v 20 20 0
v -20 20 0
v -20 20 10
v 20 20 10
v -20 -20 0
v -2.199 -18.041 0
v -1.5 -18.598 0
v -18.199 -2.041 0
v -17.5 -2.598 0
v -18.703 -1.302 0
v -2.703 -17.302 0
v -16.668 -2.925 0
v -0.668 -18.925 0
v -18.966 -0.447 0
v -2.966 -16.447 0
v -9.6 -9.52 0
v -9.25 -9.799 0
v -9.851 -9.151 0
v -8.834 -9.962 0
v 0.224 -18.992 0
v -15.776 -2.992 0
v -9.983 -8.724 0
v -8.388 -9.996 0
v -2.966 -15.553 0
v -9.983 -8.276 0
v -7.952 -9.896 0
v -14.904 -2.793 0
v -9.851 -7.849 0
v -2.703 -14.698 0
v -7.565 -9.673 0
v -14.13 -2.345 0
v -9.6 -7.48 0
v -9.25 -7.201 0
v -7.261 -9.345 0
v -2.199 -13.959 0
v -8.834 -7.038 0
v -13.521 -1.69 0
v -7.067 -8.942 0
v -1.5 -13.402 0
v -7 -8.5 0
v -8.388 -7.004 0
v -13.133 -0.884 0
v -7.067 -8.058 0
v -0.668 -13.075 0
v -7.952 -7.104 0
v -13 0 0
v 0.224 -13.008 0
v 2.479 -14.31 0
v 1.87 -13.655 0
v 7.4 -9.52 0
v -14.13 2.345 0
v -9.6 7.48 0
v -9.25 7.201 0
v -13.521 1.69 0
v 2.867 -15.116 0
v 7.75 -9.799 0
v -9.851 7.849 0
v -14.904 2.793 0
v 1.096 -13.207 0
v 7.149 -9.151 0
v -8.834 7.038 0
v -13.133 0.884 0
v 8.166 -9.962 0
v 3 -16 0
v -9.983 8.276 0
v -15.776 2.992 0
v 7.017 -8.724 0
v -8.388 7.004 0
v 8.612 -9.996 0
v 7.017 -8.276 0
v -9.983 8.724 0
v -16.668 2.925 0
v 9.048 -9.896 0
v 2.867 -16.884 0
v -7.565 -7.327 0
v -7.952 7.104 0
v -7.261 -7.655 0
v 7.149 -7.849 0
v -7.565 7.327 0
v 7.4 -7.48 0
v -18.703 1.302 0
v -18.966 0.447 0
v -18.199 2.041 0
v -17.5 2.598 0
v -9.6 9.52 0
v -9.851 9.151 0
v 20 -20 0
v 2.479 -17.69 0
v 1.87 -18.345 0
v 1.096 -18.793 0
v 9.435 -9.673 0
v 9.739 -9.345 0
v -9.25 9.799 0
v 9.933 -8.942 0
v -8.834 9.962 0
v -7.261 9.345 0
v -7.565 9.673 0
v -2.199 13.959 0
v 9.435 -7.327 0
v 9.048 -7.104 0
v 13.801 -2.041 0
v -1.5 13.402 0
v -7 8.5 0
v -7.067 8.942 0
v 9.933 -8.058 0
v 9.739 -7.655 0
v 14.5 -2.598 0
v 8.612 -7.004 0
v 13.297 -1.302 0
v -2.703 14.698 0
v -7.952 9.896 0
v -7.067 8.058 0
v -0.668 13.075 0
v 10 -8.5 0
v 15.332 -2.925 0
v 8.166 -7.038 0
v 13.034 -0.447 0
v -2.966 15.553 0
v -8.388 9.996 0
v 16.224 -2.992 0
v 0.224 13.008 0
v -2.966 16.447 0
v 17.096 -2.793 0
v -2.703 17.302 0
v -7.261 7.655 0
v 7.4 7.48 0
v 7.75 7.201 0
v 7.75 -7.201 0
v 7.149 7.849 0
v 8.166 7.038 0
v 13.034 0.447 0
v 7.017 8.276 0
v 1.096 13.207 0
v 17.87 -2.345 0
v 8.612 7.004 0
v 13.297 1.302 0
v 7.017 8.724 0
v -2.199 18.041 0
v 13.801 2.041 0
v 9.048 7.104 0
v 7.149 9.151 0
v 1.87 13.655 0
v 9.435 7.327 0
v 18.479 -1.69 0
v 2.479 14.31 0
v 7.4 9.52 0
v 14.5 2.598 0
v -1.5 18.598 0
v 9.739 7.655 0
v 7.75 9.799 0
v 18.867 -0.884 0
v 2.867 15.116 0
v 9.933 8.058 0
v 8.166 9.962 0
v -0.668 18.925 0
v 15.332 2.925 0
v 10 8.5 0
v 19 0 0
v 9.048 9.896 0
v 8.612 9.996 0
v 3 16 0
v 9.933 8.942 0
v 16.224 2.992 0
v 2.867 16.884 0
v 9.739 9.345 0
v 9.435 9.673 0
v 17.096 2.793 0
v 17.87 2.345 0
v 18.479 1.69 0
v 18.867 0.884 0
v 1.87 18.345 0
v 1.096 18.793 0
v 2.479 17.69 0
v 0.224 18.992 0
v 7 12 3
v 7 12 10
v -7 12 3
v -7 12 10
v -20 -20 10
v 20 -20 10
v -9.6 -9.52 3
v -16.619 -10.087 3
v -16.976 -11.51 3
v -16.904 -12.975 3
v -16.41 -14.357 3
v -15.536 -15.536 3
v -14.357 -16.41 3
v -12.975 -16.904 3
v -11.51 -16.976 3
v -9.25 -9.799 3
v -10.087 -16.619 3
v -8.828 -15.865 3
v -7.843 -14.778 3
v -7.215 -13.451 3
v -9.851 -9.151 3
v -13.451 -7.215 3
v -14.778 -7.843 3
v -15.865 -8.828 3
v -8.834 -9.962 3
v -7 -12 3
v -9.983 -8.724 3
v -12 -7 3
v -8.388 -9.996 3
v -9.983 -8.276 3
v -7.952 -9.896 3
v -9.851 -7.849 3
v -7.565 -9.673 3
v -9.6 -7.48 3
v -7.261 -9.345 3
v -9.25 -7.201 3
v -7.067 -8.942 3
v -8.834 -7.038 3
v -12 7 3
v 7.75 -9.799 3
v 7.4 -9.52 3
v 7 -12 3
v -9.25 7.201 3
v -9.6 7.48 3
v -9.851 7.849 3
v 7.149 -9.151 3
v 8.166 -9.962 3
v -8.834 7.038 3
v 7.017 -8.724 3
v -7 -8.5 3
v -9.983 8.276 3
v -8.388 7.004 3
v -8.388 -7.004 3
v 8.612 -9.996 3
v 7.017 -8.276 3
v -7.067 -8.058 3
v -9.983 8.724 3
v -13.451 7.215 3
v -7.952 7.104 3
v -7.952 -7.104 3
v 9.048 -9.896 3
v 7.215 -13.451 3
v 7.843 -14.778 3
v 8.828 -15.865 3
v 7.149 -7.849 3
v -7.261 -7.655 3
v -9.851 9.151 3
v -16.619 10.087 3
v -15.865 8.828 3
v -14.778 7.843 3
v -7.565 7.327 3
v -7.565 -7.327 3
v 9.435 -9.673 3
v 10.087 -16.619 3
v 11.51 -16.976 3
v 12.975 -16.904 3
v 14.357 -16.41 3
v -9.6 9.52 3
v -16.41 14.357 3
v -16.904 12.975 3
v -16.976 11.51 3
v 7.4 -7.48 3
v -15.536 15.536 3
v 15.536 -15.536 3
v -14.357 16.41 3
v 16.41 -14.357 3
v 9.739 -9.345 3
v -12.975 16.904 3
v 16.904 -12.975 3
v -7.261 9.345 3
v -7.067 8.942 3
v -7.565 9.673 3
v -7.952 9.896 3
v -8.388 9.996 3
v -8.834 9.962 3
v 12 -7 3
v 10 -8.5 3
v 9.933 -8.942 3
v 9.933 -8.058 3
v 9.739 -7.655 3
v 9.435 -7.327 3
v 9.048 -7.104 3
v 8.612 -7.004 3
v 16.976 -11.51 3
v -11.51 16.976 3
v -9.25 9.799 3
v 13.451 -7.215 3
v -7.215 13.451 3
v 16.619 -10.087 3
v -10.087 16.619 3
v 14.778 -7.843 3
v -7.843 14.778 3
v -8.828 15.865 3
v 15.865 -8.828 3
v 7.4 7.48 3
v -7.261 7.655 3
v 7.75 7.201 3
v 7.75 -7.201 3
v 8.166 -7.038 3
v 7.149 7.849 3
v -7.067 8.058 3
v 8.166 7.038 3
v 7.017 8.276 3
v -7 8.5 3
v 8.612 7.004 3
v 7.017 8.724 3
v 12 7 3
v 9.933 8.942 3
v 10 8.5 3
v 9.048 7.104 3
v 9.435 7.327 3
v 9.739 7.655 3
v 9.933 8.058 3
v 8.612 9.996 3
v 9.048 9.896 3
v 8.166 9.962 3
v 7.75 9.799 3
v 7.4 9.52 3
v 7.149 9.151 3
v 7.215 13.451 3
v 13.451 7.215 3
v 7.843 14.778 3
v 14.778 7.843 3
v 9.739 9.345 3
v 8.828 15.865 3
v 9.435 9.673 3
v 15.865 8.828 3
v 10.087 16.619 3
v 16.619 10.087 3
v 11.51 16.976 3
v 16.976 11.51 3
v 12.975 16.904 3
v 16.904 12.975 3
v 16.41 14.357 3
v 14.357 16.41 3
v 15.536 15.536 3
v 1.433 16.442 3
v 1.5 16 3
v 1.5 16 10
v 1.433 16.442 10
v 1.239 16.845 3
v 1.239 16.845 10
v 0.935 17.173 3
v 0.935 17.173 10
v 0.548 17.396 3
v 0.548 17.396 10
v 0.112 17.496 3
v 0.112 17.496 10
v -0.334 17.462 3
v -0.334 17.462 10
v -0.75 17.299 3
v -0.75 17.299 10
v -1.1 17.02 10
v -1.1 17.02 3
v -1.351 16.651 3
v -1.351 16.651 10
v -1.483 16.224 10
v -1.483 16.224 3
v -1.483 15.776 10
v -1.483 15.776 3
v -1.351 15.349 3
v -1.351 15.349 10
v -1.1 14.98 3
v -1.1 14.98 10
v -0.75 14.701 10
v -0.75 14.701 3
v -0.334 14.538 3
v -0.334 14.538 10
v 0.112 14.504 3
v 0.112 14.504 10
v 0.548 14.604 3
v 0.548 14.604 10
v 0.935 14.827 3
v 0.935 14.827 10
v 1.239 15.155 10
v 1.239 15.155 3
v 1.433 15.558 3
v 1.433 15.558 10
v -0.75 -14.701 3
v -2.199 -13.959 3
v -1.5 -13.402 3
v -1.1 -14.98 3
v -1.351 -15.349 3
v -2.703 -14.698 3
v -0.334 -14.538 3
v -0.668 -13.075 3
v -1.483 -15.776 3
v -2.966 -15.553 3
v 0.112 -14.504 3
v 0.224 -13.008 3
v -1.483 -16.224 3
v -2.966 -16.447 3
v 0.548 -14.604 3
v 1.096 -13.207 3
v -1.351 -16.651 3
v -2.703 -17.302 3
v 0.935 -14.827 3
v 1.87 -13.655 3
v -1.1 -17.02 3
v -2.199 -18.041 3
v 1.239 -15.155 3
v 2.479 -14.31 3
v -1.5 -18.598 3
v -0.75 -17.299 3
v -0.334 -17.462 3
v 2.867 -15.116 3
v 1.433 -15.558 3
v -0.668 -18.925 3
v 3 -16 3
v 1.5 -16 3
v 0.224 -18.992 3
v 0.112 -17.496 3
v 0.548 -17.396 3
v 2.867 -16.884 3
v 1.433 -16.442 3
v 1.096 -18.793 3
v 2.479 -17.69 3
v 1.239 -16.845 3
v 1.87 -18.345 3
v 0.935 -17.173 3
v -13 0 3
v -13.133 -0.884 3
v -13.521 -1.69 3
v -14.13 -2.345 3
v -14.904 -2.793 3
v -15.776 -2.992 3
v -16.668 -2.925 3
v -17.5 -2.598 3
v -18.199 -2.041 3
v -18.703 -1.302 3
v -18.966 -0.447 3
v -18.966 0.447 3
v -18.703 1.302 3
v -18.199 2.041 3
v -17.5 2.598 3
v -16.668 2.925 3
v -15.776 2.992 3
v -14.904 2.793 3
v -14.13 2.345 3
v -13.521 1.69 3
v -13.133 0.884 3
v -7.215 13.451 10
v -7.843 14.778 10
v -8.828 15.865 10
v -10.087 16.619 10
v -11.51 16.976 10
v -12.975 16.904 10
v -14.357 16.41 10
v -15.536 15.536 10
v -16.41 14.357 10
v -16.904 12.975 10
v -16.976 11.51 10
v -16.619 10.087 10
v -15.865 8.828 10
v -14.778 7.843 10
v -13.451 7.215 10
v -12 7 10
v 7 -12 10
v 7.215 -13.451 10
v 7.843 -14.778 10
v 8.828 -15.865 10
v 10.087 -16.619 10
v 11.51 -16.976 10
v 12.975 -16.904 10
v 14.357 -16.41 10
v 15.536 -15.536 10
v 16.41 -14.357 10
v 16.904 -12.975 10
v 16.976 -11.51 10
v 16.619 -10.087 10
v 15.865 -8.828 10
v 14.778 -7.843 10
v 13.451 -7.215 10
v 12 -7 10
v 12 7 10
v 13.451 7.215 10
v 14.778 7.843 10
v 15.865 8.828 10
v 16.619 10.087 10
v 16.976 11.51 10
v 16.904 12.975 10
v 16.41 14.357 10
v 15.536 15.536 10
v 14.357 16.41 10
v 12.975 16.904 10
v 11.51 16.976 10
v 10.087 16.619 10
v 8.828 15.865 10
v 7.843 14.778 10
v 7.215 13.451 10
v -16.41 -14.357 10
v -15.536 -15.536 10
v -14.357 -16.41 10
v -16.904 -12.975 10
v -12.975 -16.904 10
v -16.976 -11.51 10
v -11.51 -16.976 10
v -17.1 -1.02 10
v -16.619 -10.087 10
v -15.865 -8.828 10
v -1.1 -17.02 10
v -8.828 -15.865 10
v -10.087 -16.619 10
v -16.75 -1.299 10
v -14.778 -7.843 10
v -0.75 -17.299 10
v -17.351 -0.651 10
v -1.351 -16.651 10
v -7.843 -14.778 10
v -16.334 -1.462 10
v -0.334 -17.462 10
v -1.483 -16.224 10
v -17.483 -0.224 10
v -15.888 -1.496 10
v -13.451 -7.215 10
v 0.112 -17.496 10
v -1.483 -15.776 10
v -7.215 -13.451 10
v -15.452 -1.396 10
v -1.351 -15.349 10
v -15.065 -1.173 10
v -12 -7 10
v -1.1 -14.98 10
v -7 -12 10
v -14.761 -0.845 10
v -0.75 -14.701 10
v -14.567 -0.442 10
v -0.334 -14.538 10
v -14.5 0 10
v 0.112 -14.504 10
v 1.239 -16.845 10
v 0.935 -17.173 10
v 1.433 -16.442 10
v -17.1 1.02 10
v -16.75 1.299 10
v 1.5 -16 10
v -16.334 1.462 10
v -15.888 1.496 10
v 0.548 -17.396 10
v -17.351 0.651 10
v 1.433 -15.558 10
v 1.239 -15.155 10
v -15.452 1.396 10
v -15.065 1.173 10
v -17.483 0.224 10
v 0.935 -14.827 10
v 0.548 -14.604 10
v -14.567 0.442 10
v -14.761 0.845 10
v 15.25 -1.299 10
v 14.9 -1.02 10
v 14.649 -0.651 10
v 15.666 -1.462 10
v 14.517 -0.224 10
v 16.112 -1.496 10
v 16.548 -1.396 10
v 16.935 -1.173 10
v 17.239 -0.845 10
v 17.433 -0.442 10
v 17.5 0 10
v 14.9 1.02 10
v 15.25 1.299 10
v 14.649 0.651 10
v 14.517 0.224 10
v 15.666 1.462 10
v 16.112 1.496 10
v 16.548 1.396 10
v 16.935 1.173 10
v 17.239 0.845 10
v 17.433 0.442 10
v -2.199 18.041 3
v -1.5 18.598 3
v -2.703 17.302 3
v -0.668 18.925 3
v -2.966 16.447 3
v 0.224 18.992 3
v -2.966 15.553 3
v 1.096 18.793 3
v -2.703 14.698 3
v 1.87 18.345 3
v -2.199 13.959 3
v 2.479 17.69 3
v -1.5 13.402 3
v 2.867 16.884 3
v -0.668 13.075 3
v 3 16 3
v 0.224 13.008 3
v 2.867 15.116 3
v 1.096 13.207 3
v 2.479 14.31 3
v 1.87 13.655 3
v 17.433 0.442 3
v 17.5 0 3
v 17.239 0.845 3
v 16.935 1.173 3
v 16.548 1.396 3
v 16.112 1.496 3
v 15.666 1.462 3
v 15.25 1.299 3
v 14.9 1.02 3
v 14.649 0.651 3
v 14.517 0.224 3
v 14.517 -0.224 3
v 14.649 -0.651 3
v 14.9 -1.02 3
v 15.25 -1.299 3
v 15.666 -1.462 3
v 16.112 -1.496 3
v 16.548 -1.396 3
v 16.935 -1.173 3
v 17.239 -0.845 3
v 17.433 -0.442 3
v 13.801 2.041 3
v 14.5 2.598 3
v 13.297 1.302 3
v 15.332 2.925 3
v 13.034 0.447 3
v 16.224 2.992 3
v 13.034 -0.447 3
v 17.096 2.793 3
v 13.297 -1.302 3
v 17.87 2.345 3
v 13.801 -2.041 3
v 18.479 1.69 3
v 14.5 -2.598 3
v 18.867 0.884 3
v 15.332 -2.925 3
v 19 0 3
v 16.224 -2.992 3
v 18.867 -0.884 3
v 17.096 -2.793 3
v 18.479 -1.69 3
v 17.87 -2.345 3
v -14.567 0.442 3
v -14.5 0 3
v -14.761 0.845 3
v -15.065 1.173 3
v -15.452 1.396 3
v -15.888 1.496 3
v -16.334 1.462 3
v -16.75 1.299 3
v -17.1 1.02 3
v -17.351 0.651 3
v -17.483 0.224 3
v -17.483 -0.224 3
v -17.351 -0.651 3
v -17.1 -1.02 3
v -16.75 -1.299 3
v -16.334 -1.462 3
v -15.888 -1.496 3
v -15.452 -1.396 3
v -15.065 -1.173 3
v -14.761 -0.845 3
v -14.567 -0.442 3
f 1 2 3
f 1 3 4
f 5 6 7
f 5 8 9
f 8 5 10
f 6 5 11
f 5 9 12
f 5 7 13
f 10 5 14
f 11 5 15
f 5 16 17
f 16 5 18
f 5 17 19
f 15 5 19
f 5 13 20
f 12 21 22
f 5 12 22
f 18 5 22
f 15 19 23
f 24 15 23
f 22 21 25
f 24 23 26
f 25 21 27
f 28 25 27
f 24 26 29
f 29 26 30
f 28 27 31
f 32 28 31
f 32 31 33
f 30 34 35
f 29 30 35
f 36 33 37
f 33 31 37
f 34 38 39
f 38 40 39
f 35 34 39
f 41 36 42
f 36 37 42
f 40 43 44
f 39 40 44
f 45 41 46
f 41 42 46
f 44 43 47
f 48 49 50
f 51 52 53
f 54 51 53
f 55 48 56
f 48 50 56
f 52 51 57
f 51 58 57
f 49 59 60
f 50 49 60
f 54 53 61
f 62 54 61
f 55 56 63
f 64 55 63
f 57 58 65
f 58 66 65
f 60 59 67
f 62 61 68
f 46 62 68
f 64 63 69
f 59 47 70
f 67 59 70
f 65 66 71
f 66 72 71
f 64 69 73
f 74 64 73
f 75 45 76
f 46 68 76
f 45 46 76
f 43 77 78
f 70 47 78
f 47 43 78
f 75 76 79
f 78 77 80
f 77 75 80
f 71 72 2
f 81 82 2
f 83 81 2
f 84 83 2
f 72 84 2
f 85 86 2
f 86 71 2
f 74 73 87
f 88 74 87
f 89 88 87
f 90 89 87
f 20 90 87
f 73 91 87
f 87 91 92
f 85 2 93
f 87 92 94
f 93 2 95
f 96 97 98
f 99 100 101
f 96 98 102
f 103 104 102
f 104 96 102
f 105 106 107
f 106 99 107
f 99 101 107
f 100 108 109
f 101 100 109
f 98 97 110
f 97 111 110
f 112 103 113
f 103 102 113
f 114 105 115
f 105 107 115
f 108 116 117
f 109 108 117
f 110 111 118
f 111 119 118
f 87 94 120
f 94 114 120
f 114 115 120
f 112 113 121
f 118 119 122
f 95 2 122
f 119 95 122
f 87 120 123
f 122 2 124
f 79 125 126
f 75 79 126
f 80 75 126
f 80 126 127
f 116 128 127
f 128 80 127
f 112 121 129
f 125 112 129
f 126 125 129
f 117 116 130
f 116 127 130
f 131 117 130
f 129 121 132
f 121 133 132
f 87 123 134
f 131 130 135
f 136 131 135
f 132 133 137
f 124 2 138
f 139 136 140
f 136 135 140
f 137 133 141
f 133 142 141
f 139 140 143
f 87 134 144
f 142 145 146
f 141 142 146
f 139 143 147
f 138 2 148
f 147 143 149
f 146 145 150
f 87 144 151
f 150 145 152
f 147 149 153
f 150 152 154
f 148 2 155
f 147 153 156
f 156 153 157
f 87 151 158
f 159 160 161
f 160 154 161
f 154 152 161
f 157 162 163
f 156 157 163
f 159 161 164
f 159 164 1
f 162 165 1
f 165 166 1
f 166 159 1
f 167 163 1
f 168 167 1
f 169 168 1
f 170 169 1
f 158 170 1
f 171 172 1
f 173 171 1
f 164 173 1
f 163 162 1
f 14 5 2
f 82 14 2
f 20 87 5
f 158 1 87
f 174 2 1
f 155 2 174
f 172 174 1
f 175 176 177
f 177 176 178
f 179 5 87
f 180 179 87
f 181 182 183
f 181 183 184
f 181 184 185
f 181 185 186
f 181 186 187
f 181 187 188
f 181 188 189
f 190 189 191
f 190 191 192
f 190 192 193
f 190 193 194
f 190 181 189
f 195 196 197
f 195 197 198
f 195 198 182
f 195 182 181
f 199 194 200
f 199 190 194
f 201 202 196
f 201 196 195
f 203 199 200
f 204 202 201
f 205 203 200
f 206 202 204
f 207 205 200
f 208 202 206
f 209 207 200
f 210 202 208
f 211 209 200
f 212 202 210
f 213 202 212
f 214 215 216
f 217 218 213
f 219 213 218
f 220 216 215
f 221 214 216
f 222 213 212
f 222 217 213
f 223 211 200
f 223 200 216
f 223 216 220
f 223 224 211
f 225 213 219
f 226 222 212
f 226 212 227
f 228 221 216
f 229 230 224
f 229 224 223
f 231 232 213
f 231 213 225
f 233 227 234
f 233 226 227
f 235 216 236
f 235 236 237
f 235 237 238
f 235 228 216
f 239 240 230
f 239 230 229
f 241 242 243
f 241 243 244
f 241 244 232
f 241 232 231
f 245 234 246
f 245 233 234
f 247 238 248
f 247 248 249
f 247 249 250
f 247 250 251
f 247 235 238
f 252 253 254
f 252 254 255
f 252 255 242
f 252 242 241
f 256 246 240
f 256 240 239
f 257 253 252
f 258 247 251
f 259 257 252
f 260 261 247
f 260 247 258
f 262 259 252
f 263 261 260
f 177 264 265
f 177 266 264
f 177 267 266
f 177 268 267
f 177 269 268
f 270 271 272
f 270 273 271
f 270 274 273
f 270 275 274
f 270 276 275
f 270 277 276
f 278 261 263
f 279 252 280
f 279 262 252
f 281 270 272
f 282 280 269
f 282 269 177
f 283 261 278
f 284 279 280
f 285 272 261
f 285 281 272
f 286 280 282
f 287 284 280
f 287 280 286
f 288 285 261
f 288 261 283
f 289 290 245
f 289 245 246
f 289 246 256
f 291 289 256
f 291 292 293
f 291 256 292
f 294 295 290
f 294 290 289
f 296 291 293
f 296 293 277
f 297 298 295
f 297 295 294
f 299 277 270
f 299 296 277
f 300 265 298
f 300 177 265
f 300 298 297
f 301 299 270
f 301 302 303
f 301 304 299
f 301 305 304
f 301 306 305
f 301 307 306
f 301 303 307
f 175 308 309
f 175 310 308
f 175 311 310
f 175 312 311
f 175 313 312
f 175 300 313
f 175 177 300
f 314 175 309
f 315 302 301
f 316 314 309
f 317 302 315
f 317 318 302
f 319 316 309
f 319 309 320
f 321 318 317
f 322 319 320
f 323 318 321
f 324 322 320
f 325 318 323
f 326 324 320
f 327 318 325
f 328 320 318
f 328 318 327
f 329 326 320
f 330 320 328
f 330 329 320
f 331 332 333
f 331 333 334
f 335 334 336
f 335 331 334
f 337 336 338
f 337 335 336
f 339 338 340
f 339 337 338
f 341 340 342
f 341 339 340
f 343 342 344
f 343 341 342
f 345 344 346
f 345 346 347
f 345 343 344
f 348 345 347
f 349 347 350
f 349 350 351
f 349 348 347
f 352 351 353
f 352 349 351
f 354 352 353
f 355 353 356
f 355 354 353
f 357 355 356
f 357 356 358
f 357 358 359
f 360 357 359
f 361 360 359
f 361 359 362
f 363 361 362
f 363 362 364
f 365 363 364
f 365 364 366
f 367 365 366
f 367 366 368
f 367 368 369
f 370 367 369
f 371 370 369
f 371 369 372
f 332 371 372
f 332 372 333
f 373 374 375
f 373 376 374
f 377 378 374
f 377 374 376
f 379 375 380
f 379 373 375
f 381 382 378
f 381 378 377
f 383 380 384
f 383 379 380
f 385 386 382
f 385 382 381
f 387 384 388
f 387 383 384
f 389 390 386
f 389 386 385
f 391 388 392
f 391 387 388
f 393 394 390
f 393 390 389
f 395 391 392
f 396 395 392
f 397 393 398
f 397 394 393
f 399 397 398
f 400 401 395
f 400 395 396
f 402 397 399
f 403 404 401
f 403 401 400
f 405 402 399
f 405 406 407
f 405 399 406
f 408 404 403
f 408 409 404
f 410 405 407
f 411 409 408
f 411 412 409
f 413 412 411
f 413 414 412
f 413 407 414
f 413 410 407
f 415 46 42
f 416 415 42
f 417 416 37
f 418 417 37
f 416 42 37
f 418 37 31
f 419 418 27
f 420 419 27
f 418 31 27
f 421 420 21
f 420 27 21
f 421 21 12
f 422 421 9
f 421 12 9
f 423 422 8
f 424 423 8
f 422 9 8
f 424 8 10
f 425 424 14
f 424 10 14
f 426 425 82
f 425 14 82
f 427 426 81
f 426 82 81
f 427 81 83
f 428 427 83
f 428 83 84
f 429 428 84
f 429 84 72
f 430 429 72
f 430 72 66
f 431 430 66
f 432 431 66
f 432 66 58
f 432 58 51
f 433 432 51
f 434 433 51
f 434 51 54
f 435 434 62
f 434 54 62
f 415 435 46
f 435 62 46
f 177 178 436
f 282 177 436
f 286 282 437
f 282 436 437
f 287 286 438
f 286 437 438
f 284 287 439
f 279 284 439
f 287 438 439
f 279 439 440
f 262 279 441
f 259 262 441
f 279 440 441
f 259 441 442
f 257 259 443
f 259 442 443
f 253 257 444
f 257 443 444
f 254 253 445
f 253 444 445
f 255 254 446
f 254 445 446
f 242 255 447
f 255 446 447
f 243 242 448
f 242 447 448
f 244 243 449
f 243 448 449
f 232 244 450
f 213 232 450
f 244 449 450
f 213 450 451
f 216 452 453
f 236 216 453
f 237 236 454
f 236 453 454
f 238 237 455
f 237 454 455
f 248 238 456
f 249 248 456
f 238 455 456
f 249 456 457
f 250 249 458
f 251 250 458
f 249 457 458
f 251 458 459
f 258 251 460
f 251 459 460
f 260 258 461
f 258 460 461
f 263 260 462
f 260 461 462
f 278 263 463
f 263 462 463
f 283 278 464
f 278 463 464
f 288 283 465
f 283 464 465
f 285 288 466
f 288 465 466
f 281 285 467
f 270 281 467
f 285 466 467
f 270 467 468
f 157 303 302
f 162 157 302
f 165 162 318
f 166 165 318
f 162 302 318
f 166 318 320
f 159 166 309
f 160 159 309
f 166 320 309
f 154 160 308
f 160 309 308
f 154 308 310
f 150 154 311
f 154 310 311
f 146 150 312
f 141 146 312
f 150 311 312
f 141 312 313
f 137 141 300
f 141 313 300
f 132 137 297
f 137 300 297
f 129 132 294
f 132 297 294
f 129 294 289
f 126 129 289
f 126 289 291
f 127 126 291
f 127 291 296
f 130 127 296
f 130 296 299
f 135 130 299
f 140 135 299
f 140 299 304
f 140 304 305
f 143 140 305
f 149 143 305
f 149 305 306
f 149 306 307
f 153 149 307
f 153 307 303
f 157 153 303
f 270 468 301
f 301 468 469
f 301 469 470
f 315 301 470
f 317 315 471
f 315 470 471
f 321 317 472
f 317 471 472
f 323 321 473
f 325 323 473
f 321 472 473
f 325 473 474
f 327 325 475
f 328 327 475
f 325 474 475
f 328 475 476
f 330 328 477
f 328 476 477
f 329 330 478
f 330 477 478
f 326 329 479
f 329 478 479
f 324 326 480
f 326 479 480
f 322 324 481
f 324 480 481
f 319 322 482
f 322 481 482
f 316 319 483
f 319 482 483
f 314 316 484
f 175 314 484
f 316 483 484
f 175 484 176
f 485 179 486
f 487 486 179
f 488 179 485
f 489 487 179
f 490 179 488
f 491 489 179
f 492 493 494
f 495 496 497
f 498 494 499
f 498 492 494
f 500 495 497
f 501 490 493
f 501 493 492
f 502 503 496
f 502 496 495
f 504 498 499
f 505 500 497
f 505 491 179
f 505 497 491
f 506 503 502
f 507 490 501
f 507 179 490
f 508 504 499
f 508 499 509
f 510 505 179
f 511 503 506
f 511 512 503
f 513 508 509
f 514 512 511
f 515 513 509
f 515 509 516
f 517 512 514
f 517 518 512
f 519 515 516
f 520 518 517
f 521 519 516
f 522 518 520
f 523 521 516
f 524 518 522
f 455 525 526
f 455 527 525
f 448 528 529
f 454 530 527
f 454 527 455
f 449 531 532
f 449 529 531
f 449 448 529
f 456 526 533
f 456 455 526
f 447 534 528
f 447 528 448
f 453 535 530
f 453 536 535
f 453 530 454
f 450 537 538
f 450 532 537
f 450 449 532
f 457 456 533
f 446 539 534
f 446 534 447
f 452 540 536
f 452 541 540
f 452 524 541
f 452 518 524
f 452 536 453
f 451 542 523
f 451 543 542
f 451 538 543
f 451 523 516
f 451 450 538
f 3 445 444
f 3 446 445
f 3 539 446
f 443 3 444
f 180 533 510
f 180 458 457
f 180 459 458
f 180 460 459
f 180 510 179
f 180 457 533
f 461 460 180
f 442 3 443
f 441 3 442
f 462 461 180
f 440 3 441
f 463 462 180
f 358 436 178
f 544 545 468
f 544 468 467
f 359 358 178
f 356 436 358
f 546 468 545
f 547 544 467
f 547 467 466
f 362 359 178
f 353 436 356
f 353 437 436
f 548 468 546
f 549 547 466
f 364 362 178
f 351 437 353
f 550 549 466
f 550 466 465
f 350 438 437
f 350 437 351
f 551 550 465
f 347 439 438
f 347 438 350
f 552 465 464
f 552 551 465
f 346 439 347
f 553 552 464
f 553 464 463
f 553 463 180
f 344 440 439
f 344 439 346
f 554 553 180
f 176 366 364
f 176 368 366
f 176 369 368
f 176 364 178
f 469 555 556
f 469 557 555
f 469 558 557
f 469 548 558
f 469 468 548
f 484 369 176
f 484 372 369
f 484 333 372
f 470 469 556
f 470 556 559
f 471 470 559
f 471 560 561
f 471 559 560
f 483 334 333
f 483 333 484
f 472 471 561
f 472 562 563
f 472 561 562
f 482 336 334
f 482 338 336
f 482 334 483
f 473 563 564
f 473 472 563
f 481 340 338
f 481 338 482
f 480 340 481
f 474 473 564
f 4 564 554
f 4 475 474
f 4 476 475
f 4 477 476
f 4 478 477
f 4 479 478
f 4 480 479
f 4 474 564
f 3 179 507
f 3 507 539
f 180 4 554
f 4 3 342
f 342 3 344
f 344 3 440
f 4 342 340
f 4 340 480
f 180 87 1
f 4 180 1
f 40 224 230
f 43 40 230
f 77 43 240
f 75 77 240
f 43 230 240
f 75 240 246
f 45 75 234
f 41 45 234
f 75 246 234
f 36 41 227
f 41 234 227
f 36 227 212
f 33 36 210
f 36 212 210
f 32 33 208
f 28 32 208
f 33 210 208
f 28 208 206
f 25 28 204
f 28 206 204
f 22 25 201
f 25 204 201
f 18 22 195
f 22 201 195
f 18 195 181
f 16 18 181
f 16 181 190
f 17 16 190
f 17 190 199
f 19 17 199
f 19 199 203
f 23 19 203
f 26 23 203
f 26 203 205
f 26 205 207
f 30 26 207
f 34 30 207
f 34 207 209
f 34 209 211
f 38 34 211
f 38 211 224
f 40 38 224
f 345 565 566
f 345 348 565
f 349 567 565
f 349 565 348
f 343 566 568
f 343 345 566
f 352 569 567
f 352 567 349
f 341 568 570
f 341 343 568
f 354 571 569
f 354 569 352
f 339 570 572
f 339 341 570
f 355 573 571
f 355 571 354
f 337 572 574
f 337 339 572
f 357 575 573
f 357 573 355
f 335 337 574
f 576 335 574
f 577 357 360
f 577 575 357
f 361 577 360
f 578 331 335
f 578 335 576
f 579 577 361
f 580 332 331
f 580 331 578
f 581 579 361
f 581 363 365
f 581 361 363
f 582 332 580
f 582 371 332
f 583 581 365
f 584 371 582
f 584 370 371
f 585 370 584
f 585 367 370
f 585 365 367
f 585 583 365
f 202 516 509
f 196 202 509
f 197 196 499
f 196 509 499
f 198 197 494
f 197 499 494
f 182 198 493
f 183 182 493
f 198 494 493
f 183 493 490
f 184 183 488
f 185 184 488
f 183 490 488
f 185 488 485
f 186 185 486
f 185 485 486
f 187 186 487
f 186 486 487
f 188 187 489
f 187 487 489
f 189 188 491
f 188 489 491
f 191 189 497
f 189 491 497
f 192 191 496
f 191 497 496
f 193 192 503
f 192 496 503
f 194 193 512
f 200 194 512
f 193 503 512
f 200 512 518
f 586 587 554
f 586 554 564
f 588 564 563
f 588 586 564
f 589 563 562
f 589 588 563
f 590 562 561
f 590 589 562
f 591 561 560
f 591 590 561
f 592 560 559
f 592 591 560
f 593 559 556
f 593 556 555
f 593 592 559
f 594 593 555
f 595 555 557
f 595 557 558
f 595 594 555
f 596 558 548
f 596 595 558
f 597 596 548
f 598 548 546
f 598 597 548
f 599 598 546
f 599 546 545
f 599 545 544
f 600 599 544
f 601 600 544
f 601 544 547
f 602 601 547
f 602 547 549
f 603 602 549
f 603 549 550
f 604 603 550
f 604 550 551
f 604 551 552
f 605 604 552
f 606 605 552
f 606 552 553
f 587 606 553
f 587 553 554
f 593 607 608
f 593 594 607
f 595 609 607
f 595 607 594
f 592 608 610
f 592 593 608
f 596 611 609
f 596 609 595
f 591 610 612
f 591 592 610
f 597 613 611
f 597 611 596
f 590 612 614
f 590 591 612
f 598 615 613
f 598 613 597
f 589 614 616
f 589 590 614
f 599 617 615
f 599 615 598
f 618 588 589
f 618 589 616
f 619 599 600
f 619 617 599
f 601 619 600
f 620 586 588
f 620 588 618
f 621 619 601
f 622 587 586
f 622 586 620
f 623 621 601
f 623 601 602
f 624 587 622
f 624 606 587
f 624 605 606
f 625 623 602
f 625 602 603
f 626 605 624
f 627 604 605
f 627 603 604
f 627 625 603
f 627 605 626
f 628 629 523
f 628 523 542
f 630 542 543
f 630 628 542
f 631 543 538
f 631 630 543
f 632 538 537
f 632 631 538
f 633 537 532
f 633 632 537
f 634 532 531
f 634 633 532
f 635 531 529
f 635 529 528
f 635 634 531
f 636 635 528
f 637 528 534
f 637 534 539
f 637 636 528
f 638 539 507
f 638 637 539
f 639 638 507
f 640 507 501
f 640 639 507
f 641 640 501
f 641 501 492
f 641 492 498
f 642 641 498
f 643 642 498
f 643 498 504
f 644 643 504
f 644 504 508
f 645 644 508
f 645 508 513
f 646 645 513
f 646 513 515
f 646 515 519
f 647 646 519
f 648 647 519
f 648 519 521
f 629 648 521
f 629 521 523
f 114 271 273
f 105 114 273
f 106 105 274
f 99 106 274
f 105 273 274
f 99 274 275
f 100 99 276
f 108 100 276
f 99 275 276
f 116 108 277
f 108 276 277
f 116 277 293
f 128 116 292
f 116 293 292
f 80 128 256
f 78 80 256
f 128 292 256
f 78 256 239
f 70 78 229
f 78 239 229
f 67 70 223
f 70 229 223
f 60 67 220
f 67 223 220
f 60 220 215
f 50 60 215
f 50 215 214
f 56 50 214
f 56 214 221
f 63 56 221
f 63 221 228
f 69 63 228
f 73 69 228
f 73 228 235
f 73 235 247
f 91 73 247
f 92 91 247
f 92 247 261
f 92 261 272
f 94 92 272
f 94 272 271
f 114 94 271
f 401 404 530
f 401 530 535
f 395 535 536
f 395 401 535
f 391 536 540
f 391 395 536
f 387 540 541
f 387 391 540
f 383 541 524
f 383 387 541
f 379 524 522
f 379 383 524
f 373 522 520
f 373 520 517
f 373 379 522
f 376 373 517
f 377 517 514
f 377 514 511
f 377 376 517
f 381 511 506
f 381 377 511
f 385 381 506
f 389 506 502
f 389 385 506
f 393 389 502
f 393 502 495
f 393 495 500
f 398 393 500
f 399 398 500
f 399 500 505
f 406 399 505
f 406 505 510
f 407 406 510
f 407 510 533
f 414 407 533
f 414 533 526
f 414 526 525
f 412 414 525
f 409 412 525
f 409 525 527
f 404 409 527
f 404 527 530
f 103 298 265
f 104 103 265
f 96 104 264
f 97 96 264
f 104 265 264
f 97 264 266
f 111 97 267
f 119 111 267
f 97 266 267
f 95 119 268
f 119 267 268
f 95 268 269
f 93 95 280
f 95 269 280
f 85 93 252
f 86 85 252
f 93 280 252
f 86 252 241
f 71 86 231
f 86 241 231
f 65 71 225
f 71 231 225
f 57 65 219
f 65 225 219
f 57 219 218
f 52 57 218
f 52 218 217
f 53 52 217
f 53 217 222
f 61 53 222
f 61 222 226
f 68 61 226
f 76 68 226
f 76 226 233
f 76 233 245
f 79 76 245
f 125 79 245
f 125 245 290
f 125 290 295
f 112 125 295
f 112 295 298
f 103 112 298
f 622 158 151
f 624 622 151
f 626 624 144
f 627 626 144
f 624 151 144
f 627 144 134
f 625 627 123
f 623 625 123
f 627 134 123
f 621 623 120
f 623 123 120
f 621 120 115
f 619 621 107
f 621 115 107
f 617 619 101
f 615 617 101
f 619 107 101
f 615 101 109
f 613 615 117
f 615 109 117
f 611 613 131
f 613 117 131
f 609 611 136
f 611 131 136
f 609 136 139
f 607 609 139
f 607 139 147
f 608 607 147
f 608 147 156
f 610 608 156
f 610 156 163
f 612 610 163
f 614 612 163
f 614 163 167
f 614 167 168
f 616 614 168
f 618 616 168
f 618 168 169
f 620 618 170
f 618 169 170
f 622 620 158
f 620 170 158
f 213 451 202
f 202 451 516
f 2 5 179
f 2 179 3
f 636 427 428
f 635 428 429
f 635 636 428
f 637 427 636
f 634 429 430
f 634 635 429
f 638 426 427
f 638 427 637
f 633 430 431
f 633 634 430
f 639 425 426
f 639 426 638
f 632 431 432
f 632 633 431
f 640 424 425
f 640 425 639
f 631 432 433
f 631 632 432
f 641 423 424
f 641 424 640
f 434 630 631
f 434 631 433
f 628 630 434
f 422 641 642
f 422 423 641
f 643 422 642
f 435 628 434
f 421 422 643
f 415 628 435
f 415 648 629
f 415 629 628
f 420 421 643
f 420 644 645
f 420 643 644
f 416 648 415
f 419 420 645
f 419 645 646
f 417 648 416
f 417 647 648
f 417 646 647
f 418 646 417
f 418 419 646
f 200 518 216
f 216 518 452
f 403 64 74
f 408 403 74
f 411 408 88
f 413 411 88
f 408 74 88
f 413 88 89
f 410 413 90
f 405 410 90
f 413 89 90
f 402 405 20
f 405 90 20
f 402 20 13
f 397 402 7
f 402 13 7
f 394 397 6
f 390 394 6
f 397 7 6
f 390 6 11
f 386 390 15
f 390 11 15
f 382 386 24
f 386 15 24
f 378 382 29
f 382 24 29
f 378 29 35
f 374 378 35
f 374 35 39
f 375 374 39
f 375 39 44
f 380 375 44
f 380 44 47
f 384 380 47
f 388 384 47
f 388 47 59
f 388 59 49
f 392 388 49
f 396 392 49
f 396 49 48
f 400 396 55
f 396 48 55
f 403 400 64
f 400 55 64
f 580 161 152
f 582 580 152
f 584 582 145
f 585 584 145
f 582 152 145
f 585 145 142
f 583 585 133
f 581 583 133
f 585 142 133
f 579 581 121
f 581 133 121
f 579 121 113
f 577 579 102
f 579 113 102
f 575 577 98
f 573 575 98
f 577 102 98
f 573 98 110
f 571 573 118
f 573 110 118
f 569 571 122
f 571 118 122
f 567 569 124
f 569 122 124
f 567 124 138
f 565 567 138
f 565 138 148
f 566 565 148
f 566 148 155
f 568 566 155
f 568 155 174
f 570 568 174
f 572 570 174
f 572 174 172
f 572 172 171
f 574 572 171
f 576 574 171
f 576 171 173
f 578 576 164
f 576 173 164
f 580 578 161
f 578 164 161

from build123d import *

# Parameters (mm, degrees)
F0_W     = 40
F0_H     = 40
F0_R     = 1.5
F1_DEPTH = 10
F3_DEPTH = 7
F4_R     = 3
F5_DEPTH = 3
F6_R     = 1.5
F7_DEPTH = 3.001


with BuildPart() as f1:
    # F0 (on Top) → F1 (new body)
    with BuildSketch(Plane.XY):
        Rectangle(F0_W, F0_H)
        with Locations((0, -16)):
            Circle(F0_R, mode=Mode.SUBTRACT)
        with Locations((-16, 0)):
            Circle(F0_R, mode=Mode.SUBTRACT)
        with Locations((16, 0)):
            Circle(F0_R, mode=Mode.SUBTRACT)
        with Locations((0, 16)):
            Circle(F0_R, mode=Mode.SUBTRACT)
    extrude(amount=F1_DEPTH)

    # F2 (on face) → F3 (cut)
    with BuildSketch(Plane.XY.offset(10)):
        with BuildLine():
            Line((7, 12), (-7, 12))
            ThreePointArc((-7, 12), (-15.535534, 15.535534), (-12, 7))
            Line((-12, 7), (-12, -7))
            ThreePointArc((-12, -7), (-15.535534, -15.535534), (-7, -12))
            Line((-7, -12), (7, -12))
            ThreePointArc((7, -12), (15.535534, -15.535534), (12, -7))
            Line((12, -7), (12, 7))
            ThreePointArc((12, 7), (15.535534, 15.535534), (7, 12))
        make_face()
    extrude(amount=-F3_DEPTH, mode=Mode.SUBTRACT)

    # F4 (on face) → F5 (cut)
    with BuildSketch(Plane(origin=(0, 0, 0), x_dir=(1, 0, 0), z_dir=(0, 0, -1))):
        with Locations((0, 16)):
            Circle(F4_R)
        with Locations((-16, 0)):
            Circle(F4_R)
        with Locations((0, -16)):
            Circle(F4_R)
        with Locations((16, 0)):
            Circle(F4_R)
    extrude(amount=-F5_DEPTH, mode=Mode.SUBTRACT)

    # F6 (on face) → F7 (cut, through all)
    with BuildSketch(Plane.XY.offset(3)):
        with Locations((-8.5, 8.5)):
            Circle(F6_R)
        with Locations((8.5, 8.5)):
            Circle(F6_R)
        with Locations((-8.5, -8.5)):
            Circle(F6_R)
        with Locations((8.5, -8.5)):
            Circle(F6_R)
    extrude(amount=-F7_DEPTH, mode=Mode.SUBTRACT)


solid = f1.part
